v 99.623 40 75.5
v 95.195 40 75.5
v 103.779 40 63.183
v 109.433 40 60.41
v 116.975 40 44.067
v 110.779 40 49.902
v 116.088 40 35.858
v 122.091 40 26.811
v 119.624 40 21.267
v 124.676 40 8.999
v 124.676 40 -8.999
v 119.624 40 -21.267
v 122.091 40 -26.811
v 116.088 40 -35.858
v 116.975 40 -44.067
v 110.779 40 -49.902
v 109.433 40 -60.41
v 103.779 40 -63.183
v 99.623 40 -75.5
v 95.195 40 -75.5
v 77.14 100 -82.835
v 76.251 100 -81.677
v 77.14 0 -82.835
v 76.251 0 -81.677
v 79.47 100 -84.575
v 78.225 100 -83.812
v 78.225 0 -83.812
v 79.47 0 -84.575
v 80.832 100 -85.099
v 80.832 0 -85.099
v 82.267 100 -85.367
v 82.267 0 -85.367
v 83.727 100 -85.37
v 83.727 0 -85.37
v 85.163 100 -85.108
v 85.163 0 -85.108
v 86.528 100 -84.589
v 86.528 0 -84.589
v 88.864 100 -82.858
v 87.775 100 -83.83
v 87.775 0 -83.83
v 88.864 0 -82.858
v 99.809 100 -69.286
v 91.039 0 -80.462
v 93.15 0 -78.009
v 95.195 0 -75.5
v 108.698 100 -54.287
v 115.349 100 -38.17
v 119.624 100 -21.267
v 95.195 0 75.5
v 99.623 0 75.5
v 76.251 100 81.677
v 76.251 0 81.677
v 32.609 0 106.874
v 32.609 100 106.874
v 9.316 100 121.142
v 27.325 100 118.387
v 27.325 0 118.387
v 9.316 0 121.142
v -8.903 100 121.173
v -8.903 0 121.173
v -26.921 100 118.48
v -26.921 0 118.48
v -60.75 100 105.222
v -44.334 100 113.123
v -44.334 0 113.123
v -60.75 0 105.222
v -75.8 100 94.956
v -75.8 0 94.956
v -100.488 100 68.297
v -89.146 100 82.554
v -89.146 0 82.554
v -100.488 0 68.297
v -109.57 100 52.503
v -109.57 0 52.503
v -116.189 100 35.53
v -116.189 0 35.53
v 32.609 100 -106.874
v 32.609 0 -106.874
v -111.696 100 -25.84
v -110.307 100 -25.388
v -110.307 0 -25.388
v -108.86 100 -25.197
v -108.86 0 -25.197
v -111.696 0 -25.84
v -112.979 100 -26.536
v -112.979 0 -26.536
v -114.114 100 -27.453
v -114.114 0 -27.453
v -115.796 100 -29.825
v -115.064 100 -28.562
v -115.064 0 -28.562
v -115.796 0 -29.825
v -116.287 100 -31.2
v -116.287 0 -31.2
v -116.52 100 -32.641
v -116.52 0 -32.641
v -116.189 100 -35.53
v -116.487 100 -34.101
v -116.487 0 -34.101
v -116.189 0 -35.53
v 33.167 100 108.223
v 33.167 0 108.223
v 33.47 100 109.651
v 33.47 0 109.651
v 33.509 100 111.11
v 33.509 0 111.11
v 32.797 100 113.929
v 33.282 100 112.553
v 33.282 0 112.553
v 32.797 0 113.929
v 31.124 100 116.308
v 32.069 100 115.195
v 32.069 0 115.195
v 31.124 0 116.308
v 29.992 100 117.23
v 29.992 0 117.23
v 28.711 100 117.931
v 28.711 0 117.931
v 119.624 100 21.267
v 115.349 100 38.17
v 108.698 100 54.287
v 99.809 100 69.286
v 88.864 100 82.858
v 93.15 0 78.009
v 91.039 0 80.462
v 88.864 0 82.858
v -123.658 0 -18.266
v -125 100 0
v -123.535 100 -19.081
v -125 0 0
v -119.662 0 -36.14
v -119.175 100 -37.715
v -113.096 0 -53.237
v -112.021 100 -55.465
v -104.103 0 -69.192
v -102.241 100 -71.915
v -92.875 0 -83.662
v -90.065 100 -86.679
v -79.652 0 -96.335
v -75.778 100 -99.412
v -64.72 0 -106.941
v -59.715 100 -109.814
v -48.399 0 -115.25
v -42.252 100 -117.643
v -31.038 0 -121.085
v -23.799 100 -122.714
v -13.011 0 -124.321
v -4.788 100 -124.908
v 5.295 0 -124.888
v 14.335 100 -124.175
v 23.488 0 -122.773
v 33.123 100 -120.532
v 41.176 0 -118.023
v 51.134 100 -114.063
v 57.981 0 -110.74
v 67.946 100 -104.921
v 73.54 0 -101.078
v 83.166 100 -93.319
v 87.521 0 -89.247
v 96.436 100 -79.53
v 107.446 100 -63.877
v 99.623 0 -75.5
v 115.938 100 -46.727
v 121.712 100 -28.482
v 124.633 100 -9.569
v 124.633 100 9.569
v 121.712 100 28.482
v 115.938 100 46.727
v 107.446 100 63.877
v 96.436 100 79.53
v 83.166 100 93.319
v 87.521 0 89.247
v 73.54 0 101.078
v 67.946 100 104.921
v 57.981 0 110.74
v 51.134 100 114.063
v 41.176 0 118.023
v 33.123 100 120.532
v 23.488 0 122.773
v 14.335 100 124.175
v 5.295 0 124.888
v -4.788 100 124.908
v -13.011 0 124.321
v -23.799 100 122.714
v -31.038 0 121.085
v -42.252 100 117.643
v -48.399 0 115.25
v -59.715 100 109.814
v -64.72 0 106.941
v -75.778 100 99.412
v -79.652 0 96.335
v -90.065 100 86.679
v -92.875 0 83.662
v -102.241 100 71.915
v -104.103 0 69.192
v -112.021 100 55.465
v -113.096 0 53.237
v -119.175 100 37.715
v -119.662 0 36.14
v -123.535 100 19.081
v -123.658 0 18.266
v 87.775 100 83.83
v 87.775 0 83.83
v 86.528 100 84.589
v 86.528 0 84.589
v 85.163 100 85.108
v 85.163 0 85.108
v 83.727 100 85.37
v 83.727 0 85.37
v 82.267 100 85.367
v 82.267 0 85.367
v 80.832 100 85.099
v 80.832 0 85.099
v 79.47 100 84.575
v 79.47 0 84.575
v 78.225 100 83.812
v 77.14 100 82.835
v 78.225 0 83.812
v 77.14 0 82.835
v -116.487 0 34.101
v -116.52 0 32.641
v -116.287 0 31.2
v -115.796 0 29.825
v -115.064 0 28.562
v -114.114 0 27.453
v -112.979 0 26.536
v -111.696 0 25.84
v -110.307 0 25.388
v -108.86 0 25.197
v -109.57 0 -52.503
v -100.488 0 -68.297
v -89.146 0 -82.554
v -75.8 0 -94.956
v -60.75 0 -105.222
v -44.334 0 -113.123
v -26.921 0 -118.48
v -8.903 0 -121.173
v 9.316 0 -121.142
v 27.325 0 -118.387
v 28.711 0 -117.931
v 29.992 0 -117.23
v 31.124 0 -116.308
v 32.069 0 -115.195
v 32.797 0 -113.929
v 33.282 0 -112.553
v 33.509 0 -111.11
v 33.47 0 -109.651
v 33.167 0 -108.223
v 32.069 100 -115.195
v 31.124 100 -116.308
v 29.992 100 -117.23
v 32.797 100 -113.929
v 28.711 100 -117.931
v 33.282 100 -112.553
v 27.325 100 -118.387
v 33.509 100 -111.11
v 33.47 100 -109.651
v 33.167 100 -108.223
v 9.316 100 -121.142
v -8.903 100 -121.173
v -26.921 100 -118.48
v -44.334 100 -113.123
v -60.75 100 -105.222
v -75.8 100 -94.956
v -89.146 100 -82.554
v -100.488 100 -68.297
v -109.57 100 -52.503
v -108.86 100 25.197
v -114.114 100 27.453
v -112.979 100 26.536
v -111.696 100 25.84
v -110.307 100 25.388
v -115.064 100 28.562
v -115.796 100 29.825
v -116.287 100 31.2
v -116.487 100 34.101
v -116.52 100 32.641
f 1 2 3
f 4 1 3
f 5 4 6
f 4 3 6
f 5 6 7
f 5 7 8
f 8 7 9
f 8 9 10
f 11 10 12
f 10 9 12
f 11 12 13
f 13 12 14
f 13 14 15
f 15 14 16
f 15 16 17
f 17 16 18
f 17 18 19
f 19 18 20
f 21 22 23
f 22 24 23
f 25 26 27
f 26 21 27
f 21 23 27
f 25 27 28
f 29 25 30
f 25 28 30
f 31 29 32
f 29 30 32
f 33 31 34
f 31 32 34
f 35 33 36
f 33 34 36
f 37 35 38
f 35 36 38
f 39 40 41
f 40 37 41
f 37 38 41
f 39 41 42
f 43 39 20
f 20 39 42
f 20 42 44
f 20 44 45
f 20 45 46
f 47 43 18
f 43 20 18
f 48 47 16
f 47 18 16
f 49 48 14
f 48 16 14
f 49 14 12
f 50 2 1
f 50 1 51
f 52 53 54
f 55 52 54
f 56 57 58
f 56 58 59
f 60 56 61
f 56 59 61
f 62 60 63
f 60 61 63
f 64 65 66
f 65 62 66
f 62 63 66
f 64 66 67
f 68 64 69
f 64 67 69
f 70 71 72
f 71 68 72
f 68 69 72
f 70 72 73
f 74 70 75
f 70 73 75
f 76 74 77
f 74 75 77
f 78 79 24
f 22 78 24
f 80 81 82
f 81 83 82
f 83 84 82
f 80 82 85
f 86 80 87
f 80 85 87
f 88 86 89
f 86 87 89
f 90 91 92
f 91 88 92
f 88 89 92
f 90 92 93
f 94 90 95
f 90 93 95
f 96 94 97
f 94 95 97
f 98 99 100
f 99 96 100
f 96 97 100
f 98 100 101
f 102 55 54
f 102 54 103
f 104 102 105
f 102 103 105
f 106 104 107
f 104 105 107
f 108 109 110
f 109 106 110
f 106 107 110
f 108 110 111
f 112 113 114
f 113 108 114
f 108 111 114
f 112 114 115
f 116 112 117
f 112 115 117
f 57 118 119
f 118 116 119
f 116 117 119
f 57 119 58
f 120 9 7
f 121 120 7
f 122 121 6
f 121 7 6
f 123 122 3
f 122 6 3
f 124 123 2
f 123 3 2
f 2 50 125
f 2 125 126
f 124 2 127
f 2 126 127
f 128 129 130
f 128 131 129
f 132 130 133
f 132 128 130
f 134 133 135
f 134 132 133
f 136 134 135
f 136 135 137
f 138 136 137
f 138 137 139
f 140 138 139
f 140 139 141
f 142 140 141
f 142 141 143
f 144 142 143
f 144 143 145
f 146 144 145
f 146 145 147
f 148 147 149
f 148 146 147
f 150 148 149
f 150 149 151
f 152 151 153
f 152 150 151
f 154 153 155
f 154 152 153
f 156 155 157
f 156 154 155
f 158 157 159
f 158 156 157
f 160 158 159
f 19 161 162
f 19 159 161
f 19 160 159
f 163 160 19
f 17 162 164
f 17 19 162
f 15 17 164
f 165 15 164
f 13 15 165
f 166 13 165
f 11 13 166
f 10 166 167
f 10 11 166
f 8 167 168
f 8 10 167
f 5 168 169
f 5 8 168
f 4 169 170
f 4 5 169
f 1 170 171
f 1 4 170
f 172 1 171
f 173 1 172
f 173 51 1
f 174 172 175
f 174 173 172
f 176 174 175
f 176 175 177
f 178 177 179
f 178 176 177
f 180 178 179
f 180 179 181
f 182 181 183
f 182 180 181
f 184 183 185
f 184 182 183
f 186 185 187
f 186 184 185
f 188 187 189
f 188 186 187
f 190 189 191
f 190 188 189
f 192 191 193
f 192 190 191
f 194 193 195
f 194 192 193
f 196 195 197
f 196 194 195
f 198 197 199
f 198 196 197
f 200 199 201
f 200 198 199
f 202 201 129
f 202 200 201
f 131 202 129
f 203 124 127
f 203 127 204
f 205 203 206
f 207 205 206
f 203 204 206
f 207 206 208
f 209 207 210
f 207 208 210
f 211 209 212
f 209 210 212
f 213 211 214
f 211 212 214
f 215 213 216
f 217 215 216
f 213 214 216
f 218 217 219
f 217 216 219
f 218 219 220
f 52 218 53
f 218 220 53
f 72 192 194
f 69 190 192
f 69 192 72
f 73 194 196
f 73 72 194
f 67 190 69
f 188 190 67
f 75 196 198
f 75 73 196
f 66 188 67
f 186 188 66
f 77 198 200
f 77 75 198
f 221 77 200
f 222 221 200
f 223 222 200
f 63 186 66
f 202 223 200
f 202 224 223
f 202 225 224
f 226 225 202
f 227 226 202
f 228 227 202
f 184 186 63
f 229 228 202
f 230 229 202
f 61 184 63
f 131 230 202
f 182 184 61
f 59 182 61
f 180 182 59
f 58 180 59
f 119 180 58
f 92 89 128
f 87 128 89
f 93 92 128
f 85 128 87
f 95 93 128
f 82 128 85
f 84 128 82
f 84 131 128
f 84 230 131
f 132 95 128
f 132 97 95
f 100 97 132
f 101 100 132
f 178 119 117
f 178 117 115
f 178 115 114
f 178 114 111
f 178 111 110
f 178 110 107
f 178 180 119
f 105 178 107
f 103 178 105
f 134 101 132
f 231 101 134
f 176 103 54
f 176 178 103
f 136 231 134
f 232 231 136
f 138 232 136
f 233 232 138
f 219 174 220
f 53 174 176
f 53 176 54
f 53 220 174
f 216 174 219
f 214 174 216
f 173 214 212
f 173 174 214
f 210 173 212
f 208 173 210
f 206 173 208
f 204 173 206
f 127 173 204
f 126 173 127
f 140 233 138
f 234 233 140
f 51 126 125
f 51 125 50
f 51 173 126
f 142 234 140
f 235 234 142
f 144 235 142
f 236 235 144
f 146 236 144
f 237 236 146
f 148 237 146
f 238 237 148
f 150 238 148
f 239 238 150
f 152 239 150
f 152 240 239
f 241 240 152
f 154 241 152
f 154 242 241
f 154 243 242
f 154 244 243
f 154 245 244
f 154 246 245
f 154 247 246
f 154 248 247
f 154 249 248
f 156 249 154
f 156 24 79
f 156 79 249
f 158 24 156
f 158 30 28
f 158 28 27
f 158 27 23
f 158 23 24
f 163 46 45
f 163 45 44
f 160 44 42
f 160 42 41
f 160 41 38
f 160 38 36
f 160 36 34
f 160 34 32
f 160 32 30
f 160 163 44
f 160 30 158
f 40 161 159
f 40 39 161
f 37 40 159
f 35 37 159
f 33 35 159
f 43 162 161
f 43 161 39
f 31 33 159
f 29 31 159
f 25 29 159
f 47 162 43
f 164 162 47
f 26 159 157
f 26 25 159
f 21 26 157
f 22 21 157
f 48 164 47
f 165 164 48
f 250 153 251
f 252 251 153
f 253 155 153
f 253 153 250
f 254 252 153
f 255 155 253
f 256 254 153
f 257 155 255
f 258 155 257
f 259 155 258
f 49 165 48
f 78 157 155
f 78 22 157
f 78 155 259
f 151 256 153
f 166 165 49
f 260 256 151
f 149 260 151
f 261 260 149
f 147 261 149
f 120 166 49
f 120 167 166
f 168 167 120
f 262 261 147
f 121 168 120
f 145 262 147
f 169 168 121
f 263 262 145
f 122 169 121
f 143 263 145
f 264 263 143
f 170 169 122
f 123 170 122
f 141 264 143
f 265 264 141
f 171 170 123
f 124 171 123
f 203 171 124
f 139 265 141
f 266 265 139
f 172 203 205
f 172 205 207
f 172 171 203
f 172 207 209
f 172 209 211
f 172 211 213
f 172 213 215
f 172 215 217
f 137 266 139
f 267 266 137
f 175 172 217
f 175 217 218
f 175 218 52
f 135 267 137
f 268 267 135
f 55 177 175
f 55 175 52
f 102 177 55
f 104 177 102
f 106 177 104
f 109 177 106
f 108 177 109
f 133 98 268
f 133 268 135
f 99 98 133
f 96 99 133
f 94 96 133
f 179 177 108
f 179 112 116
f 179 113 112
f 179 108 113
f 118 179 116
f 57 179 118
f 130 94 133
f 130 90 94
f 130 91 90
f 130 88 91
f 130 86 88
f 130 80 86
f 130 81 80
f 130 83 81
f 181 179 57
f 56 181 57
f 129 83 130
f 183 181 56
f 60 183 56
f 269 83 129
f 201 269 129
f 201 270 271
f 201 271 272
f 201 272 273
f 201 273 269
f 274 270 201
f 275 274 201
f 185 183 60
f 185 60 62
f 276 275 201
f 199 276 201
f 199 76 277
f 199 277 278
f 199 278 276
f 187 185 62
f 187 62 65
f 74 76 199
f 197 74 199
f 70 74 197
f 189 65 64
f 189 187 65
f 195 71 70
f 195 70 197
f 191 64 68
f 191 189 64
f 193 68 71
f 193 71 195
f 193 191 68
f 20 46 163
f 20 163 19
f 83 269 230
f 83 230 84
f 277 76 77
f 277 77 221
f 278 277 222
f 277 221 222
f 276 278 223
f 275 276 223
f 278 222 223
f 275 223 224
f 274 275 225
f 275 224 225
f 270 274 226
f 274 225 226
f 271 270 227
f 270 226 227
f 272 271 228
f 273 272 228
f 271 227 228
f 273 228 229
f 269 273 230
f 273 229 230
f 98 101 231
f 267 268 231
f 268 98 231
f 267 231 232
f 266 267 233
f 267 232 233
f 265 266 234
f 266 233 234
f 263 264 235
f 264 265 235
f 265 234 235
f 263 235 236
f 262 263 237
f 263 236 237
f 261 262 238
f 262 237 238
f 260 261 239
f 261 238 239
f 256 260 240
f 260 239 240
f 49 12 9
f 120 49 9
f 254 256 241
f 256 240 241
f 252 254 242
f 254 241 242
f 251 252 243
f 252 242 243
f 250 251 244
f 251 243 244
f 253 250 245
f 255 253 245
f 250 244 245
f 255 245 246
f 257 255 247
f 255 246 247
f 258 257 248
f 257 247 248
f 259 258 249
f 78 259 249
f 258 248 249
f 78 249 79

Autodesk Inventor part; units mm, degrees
ref_plane "YZ Plane" through (0, 0, 0) normal (1, 0, 0) x (0, 1, 0)
ref_plane "XZ Plane" through (0, 0, 0) normal (0, 1, 0) x (-1, 0, 0)
ref_plane "XY Plane" through (0, 0, 0) normal (0, 0, 1) x (1, 0, 0)
sketch "スケッチ1" plane through (0, 0, 0) normal (0, 1, 0) x (-1, 0, 0)
  circle A0 centre (0, 0) radius 125
  circle A1 centre (0, 0) radius 121.5
  line L0 (118.86, 0) -> (118.86, -25.1903)
  line L1 (118.86, 0) -> (118.86, 25.1903)
  line L2 (118.86, 25.1903) -> (108.86, 25.1903)
  line L3 (108.86, 25.1903) -> (108.86, -25.1903)
  line L4 (108.86, -25.1903) -> (118.86, -25.1903)
  line L5 (118.86, -25.1903) -> (118.86, 25.1903)
  line L6 (-59.43, 102.9358) -> (-37.6146, 115.5309)
  line L7 (-59.43, 102.9358) -> (-81.2454, 90.3406)
  line L8 (-81.2454, 90.3406) -> (-76.2454, 81.6804)
  line L9 (-76.2454, 81.6804) -> (-32.6146, 106.8707)
  line L10 (-32.6146, 106.8707) -> (-37.6146, 115.5309)
  line L11 (-37.6146, 115.5309) -> (-81.2454, 90.3406)
  line L12 (-59.43, -102.9358) -> (-81.2454, -90.3406)
  line L13 (-59.43, -102.9358) -> (-37.6146, -115.5309)
  line L14 (-37.6146, -115.5309) -> (-32.6146, -106.8707)
  line L15 (-32.6146, -106.8707) -> (-76.2454, -81.6804)
  line L16 (-76.2454, -81.6804) -> (-81.2454, -90.3406)
  line L17 (-81.2454, -90.3406) -> (-37.6146, -115.5309)
  dimension "d0" = 250
  dimension "d1" = 243
  dimension "d2" = 118.86
  dimension "d3" = 10
  dimension "d6" = 360
extrude "押し出し1" add sketch "スケッチ1" along normal blind 100 contours A0 | A1 L0 L1 | L1 L0 L4 L3 L2 | L6 L7 A1 | L10 L9 L8 L7 L6 | A1 L12 L13 | L13 L12 L16 L15 L14
fillet "フィレット1" radius 8 6 edges at (37.6146, 50, -115.5309) (81.2454, 50, -90.3406) (-118.86, 50, 25.1903) (-118.86, 50, -25.1903) (81.2454, 50, 90.3406) (37.6146, 50, 115.5309)
sketch "スケッチ4" plane through (0, 100, 0) normal (0, 1, 0) x (1, 0, 0)
  line L0 (119.6242, 0) -> (119.6242, -21.2671)
  arc A0 (88.8593, -82.863) -> (88.8593, 82.863) centre (0, 0) ccw projected
  line L1 (119.6242, 0) -> (119.6242, 21.2671)
  arc A1 (119.6242, -21.2671) -> (119.6242, 21.2671) centre (0, 0) ccw
extrude "押し出し4" add sketch "スケッチ4" against normal blind 100
sketch "スケッチ5" plane through (119.6242, 100, -21.2671) normal (-1, 0, 0) x (0, 0, 1)
  line L0 (96.7671, -100) -> (-54.2329, -100)
  line L1 (-54.2329, -100) -> (-54.2329, -64.5)
  line L2 (-54.2329, -64.5) -> (96.7671, -64.5)
  line L3 (96.7671, -64.5) -> (96.7671, -100)
  line L4 (96.7671, -100) -> (-54.2329, -64.5) construction
  line L5 (-54.2329, -100) -> (96.7671, -64.5) construction
  line L6 (42.5342, -100) -> (0, -100) projected
  point P0 (21.2671, -100)
  point P1 (21.2671, -82.25)
  dimension "d20" = 151
  dimension "d21" = 35.5
  dimension "d22" = 0
extrude "押し出し5" add sketch "スケッチ5" along normal blind 30
sketch "スケッチ6" plane through (89.6242, 100, -21.2671) normal (-1, 0, 0) x (0, 0, 1)
  line L0 (96.7671, -64.5) -> (-54.2329, -64.5) projected
  line L1 (-54.2329, -100) -> (96.7671, -100) projected
  line L2 (-54.2329, -64.5) -> (96.7671, -64.5)
  line L3 (96.7671, -64.5) -> (96.7671, -100)
  line L4 (96.7671, -100) -> (-54.2329, -100)
  line L5 (-54.2329, -100) -> (-54.2329, -64.5)
  line L6 (-54.2329, -64.5) -> (-54.2329, -100) projected
  line L7 (-54.2329, -64.5) -> (96.7671, -64.5)
  line L8 (96.7671, -64.5) -> (96.7671, -60)
  line L9 (96.7671, -60) -> (-54.2329, -60)
  line L10 (-54.2329, -60) -> (-54.2329, -64.5)
  point P0 (21.2671, -100)
  point P1 (-54.2329, -100)
  dimension "d27" = 151
  dimension "d28" = 4.5
extrude "押し出し6" cut sketch "スケッチ6" against normal blind 100
properties part number "allwall" material "PC/ABS プラスチック"
